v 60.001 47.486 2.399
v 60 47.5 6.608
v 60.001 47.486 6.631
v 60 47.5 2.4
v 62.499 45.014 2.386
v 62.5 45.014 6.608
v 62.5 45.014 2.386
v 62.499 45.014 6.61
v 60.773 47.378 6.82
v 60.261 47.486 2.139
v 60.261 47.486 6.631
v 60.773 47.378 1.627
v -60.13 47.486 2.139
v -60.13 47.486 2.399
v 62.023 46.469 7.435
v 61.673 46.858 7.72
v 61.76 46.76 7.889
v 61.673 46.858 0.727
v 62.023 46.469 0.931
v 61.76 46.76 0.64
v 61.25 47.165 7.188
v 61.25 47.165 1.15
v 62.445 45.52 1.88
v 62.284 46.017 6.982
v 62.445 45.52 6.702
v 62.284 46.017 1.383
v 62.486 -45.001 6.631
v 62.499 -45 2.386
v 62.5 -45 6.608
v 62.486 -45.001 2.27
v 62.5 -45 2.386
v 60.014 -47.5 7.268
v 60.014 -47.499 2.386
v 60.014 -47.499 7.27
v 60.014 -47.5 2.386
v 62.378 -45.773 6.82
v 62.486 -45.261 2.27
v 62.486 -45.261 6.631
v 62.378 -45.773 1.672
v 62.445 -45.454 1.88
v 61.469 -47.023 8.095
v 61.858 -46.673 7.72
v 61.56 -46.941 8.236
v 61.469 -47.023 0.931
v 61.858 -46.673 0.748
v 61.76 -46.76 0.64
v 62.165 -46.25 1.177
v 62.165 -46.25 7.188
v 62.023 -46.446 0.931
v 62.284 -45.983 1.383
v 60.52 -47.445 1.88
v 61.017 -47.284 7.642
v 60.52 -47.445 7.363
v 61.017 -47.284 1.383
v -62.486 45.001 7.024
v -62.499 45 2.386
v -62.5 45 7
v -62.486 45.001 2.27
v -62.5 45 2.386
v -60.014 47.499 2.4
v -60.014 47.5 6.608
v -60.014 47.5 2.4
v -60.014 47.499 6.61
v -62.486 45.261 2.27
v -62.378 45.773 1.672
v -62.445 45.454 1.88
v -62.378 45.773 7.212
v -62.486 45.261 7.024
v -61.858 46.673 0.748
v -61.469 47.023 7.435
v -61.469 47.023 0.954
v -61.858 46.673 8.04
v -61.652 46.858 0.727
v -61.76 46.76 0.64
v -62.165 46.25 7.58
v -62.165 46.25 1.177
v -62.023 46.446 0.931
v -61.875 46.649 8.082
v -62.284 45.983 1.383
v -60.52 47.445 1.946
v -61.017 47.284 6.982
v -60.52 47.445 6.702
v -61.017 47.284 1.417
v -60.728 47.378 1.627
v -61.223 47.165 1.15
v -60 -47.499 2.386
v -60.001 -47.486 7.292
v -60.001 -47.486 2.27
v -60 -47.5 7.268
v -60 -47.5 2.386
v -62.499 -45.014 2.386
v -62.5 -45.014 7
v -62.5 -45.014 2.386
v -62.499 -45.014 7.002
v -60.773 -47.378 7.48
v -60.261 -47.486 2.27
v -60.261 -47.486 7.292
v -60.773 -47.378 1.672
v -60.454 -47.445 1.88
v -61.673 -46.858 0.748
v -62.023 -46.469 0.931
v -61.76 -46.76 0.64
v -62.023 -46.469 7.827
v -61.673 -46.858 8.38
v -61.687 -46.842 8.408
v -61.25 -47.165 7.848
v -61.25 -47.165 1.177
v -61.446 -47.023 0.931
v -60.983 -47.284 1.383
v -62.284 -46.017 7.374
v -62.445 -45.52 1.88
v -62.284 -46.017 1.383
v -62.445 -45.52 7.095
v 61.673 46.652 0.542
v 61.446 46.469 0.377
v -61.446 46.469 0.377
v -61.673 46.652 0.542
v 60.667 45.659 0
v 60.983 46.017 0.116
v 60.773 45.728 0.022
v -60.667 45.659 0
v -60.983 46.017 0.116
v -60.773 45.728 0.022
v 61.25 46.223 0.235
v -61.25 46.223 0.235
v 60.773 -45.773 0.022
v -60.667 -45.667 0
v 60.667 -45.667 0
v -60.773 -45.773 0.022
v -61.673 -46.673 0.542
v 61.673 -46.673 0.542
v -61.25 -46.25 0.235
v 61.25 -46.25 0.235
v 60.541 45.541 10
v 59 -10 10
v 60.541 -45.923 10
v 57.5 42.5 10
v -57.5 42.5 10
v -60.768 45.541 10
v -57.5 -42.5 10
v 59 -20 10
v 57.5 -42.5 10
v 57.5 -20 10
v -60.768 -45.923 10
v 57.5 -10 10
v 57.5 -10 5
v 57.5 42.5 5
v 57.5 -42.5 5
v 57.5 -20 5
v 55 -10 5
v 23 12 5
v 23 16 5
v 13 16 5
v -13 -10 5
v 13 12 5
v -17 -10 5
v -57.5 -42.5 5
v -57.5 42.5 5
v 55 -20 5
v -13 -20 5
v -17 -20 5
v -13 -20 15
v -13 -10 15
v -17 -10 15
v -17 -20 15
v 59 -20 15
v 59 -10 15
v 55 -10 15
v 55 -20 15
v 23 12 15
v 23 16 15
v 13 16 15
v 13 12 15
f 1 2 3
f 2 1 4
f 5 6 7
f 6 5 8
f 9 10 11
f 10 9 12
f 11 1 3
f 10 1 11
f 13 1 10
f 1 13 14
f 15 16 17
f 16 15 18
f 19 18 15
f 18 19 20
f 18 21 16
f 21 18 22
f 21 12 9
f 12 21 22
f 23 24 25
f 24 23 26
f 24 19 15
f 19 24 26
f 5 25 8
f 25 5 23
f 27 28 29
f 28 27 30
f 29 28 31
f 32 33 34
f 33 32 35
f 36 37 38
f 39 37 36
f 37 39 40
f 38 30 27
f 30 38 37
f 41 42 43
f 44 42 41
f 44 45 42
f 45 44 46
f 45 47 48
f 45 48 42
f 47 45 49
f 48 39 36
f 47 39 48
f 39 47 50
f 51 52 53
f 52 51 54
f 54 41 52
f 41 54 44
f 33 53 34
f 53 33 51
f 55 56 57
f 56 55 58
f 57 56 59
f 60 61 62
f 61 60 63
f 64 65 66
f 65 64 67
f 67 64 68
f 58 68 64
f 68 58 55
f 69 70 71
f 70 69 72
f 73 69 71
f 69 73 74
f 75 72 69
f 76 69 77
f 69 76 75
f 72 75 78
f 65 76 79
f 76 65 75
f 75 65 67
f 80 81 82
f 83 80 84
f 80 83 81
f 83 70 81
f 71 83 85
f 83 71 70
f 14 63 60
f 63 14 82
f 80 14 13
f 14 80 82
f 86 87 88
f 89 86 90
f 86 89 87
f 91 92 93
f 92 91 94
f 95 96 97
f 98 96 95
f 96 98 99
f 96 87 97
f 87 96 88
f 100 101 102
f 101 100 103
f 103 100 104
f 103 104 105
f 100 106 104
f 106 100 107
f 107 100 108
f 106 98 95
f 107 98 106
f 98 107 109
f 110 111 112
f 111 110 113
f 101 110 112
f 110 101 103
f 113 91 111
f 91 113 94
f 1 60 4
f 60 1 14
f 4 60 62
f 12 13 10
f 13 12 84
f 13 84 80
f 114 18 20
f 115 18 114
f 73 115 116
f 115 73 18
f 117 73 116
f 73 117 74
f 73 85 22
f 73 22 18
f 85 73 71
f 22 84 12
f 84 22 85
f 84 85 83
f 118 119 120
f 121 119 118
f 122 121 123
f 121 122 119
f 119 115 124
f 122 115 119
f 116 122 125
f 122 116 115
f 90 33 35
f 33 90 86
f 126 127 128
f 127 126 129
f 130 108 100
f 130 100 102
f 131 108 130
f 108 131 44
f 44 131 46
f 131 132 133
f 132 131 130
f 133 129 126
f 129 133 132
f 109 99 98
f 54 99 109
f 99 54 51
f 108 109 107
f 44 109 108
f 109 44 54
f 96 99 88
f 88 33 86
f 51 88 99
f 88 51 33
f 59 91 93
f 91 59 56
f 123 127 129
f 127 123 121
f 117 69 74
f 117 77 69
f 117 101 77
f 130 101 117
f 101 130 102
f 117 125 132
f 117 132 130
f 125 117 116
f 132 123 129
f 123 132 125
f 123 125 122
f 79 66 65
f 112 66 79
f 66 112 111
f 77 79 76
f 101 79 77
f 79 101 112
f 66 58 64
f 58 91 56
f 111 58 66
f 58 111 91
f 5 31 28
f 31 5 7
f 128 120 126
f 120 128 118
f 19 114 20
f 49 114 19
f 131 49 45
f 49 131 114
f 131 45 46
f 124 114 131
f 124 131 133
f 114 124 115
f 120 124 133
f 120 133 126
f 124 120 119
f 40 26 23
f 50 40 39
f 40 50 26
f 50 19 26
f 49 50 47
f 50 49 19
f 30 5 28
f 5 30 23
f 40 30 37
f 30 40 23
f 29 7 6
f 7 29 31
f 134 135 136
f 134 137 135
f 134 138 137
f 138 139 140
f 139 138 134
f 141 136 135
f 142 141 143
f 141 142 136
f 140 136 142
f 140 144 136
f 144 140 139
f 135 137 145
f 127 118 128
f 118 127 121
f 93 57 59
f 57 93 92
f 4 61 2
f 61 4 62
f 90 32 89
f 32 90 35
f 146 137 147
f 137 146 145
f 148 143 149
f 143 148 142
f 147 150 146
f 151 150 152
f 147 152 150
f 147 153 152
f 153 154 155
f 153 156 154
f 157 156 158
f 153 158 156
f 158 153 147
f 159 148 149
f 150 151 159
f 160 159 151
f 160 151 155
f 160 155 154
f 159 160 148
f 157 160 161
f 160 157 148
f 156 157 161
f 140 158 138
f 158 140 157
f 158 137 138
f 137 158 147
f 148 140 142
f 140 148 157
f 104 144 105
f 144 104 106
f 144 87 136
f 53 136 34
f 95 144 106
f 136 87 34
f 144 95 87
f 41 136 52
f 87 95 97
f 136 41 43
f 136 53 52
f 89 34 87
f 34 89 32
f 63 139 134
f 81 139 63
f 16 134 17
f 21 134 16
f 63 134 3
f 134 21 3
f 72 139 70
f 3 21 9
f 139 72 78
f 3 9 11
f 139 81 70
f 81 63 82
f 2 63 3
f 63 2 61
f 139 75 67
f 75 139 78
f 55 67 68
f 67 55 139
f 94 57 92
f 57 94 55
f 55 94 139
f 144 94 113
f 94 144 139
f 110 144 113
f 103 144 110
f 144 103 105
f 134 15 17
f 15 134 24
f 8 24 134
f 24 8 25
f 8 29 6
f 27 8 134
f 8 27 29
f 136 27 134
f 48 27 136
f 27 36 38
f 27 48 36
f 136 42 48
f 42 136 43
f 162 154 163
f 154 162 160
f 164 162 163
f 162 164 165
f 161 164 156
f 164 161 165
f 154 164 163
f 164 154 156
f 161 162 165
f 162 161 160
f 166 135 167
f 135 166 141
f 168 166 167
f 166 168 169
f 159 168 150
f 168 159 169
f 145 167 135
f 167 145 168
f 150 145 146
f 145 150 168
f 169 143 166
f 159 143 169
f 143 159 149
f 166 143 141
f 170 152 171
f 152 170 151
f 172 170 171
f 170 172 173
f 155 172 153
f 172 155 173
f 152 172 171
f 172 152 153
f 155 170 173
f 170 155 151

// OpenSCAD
bottom_encl();

module bottom_encl(){
    g_w = 125;
    g_l = 95;
    
    translate([-g_w/2, -g_l/2, 0])
    difference(){
        union(){
        cube([g_w, g_l, 10]);


        }
        union(){
        translate([5, 5, 5])
            cube([g_w-10, g_l-10, 60]);
        }
        
        translate([g_w, g_l, -0.1])
            rotate([0,0,180])
            fillet(60,5);
            
            translate([g_w, 0, -0.1])
            rotate([0,0,90])
            fillet(60,5);
            
       translate([0, g_l, -0.1])
            rotate([0,0,270])
            fillet(60,5);
            
            translate([0, 0, -0.1])
            rotate([0,0,0])
            fillet(60,5);
        
        translate([0, g_l, -0.1])
            rotate([0,90,0])
            rotate([0,0,180])
            fillet(g_w,5);
            
        translate([0, 0, -0.1])
            rotate([0,90,0])
            rotate([0,0,90])
            fillet(g_w,5);
            
        translate([0, g_w, -0.1])
            rotate([90,0,0])
            rotate([0,0,0])
            fillet(g_w,5);
            
        translate([g_w, 0, -0.1])
            rotate([90,0,0])
            rotate([0,0,90])
            fillet(g_w,5);
            
        translate([g_w, 0, -0.1])
            rotate([-90,0,0])
            rotate([0,0,180])
            fillet(g_w,5);
            
        translate([0,1,9])
        rotate([60,0,0])
        translate([0,-22,0])
        cube([130,30,3]);
        
        translate([0,89,17])
        rotate([-60,0,0])
        translate([0,5,0])
        cube([130,30,3]);
        
        translate([0,0,7])
        rotate([0,-60,0])
        cube([30,105,3]);
        
        translate([119,0,17])
        rotate([0,60,0])
        cube([30,100,3]);
    }
    
    translate([-17,-20,5])
    union(){
        cube([4,10,10]);
        translate([68+4,0,0])
        cube([4,10,10]);
        translate([30,-24+56,0])
        cube([10,4,10]);
    }
}

module fillet(h, d){
    difference(){
        cylinder(h=h, d=d, $fn=30);
        union(){
            translate([d/2, d/2, -0.1])
            cylinder(h=h+0.2, d=d, $fn=30);
        }
    }
}
